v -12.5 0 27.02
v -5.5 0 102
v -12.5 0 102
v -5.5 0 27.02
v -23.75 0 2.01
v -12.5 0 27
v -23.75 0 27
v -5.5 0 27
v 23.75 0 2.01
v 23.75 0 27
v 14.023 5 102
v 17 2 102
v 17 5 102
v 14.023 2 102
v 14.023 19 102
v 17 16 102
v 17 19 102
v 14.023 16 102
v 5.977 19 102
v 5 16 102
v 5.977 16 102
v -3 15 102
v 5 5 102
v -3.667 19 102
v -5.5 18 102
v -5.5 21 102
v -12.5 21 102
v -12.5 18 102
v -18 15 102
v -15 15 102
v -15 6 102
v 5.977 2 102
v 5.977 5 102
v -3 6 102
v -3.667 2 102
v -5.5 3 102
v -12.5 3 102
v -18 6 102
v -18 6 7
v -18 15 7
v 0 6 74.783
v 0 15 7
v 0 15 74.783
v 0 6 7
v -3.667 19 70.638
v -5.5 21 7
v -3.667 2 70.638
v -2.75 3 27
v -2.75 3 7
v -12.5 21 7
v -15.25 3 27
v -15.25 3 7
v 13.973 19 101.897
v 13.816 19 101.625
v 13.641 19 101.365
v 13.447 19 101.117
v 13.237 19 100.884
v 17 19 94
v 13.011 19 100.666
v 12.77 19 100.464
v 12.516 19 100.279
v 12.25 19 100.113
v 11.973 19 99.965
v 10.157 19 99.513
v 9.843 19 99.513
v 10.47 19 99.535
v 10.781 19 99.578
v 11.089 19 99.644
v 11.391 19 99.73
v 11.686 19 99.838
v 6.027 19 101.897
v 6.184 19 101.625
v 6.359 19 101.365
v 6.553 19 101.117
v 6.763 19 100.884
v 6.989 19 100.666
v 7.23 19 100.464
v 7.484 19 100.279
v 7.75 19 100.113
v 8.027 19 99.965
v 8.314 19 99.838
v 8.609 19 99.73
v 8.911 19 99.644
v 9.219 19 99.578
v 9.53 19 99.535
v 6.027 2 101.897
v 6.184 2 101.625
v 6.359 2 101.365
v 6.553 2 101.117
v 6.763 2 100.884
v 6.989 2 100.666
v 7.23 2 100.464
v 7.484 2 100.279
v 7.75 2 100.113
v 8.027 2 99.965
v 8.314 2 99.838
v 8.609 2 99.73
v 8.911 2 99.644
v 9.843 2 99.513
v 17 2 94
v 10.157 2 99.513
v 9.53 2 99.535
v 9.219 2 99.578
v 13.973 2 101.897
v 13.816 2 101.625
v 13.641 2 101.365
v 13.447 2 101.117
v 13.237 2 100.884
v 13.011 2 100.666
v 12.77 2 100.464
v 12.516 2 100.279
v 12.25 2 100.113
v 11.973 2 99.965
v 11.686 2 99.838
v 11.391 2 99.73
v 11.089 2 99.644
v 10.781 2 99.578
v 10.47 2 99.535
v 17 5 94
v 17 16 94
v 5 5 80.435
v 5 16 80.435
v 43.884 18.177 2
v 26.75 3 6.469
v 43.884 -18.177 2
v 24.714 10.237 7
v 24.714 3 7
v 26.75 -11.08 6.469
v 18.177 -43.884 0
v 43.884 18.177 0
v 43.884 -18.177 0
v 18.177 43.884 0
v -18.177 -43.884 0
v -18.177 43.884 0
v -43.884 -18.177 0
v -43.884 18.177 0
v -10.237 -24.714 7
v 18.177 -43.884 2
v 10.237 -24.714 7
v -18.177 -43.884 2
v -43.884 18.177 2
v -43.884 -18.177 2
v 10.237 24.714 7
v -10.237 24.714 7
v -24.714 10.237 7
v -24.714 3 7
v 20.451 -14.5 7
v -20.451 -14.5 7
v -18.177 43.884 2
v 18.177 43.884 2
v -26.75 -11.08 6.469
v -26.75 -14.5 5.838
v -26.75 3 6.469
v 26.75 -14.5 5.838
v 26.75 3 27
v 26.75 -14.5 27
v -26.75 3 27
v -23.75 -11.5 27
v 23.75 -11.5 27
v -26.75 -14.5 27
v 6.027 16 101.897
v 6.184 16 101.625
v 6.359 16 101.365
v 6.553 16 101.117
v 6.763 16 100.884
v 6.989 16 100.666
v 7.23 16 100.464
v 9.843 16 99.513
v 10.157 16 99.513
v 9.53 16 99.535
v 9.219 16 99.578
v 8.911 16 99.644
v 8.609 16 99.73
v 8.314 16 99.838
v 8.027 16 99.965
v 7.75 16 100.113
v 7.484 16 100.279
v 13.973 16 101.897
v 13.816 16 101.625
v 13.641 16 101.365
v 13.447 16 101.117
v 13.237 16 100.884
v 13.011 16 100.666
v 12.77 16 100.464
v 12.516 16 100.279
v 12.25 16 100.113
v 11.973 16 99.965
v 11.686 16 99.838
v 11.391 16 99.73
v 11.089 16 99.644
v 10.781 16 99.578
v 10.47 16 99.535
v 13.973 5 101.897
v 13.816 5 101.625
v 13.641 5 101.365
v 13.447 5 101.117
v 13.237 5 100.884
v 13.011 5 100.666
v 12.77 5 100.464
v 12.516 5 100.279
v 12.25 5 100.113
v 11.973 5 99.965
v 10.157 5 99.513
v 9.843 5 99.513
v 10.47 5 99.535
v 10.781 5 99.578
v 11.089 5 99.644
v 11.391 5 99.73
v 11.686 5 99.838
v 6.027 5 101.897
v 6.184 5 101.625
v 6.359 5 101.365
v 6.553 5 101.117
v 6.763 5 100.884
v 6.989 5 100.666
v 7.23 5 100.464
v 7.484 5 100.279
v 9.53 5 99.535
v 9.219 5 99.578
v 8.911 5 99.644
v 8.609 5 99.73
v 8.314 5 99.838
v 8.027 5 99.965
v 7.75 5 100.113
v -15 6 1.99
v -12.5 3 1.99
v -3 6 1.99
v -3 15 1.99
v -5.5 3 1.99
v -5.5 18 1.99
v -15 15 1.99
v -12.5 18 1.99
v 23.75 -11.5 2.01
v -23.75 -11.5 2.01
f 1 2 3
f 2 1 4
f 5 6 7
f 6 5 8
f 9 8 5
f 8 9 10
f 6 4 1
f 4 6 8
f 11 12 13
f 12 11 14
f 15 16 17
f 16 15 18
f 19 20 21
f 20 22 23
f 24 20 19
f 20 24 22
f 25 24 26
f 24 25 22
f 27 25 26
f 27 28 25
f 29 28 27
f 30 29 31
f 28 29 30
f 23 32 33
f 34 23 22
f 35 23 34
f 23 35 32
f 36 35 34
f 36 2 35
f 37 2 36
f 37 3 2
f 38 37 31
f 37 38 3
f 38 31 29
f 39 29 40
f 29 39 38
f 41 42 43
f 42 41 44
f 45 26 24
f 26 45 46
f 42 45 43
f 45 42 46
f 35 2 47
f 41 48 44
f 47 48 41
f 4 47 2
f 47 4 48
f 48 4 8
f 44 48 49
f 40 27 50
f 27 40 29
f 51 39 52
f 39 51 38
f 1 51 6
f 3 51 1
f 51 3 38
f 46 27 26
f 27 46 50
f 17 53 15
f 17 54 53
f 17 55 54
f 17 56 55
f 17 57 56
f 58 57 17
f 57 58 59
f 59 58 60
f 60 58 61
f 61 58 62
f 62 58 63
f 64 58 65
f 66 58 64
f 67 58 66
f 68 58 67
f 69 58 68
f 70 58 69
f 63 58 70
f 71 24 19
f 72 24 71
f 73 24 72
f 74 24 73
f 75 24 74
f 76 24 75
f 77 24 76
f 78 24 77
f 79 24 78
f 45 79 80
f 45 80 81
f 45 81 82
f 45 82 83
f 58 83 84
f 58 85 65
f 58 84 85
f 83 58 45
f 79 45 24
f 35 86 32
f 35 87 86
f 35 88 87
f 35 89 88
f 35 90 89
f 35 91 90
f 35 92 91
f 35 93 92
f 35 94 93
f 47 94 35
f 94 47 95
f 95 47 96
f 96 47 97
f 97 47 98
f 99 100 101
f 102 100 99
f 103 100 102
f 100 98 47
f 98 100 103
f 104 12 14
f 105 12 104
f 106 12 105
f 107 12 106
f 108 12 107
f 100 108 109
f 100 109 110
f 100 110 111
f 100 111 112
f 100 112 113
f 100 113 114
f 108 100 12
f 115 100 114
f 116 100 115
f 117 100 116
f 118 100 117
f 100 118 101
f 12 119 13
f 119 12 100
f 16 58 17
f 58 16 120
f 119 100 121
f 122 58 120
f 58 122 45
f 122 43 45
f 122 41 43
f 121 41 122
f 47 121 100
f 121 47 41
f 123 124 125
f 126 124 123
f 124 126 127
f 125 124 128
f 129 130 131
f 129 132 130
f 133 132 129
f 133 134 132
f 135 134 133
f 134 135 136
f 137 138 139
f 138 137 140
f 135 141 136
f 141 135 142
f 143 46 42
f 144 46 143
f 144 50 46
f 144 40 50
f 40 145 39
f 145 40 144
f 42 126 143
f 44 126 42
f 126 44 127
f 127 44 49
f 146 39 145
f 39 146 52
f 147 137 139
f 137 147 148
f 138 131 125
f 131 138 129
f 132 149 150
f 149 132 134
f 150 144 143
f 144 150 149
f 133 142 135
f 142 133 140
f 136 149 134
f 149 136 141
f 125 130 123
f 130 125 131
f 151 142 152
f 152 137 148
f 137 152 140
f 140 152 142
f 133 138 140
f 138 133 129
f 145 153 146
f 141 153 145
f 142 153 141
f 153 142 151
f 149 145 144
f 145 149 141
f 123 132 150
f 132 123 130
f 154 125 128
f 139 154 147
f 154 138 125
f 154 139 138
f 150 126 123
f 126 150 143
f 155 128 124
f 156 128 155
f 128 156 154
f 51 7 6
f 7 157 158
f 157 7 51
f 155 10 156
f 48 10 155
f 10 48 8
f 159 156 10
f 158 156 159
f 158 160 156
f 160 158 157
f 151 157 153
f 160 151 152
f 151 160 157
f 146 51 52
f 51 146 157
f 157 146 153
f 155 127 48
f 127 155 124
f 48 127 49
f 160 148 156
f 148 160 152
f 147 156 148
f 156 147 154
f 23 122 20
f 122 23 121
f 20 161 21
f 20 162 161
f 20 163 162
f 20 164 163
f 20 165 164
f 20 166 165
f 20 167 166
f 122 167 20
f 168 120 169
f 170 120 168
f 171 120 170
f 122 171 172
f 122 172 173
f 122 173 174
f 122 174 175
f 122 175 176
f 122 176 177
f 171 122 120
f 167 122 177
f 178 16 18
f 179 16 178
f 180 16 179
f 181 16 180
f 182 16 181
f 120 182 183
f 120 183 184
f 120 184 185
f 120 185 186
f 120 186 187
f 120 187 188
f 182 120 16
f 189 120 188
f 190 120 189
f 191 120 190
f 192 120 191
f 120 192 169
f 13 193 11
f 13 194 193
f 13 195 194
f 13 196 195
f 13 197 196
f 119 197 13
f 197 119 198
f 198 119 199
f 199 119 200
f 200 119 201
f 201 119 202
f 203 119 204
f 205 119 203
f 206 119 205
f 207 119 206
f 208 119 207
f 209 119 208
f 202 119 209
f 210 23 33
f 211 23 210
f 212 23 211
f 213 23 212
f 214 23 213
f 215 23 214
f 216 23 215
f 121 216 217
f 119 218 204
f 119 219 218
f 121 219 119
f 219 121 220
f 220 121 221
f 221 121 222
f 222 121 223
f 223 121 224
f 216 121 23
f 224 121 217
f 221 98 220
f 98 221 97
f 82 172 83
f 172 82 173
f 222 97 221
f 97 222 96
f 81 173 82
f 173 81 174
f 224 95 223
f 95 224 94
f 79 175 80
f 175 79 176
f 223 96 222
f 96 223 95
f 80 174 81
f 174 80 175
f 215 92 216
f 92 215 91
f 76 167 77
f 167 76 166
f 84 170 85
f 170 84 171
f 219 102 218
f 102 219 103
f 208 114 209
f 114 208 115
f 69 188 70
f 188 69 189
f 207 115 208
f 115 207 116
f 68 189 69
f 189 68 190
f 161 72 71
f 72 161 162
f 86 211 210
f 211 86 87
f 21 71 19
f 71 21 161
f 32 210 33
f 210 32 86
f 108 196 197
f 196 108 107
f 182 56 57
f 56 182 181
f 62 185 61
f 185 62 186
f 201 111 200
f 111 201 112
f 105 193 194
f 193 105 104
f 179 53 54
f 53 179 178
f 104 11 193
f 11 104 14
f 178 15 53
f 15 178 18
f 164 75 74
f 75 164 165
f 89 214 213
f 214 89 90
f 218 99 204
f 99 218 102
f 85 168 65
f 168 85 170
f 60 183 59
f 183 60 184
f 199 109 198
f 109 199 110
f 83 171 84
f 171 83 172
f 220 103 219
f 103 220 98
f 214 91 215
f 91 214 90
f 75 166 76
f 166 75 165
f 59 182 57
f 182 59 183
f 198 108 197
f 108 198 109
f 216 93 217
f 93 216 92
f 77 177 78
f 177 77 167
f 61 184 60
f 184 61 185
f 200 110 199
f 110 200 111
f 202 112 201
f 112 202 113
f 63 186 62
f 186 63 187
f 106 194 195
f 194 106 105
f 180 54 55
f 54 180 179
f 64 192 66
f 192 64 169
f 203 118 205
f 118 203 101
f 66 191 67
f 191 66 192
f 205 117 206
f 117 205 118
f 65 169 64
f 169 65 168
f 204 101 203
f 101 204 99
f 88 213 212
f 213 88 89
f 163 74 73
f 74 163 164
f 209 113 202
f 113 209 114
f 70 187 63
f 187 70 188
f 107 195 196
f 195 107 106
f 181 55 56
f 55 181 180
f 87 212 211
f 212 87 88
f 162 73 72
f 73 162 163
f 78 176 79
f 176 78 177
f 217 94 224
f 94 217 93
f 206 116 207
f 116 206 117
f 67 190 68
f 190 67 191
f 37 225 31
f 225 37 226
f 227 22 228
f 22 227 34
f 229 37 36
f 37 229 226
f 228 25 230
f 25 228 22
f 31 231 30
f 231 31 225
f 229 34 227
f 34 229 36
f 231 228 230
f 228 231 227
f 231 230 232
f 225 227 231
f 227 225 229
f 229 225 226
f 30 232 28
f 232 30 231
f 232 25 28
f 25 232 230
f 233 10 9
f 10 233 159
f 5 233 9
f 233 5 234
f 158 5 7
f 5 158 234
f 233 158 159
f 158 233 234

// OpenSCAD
eps = 0.01;
$fn = 90;

// parameters
// base diameters
b_d = 95;
// base thickness
b_t = 2;
// base rising
b_r = 5;

// general parameters
// wall thickness
wt = 3;

// accessories dimensions
// rasor blade storage dimensions
rb_x = 47.5;
rb_y = 11.5;
rb_z = 72;
rb_h = 25;

// razor dimension
r_x = 9;
//r_y = 9;
r_y = 11;
r_o = 5;
r_z = 100;
r_d = 5;
r_do = 3;
r_t = 5+r_do;

// toothbrush dimensions
tb_X = 12;
tb_x = 7;
tb_Y = 15;
tb_y = 9;
tb_z = 100;

// possible extention into separete module
module base()
{
    hull()
    {
        cylinder(d=b_d, h=b_t, $fn=8);
        translate([0,0,b_t])
            cylinder(d=rb_x+2*wt, h=b_r, $fn=8);
    }
    
}

module holder()
{
    difference()
    {
        union()
        {
            // base
            rotate([0,0,22.5]) base();
            
            // toothbrush block
            translate([tb_X/2+wt-tb_X-2*wt,tb_Y/2+wt,b_t])
            {
                hull()
                {
                    // vertical
                    translate([-tb_x/2, -tb_Y/2-wt, 0])
                        cube([tb_x, tb_Y+2*wt, tb_z]);
                    // horizontal
                    translate([-tb_X/2-wt, -tb_y/2, 0])
                        cube([tb_X+2*wt, tb_y, tb_z]);
                }
                
                // razor hook
                hull()
                {
                    // razor hook
                    translate([tb_X/2+2*wt,-r_y/2-wt,r_z-r_t])
                        cube([r_o+r_x,r_y+2*wt,r_t]);
                    
                    // razor hook support
                    translate([0,
                                -r_y/2-wt,
                                r_z-r_o-r_x-r_t-tb_X/2-2*wt])
                        cube([  wt,
                                r_y+2*wt,
                                r_o+r_x+r_t+tb_X/2+2*wt]);
                }
                
            }
            
            // razor blades stock holder
            translate([-rb_x/2-wt,-rb_y-wt,b_t])
                cube([rb_x+2*wt,rb_y+2*wt,rb_h]);
        }
        
        // toothbrush hole
        translate([tb_X/2+wt-tb_X-2*wt,tb_Y/2+wt,b_t-eps])
        {
            hull()
            {
                // vertical
                translate([-tb_x/2, -tb_Y/2, 0])
                    cube([tb_x, tb_Y, tb_z+2*eps]);
                // horizontal
                translate([-tb_X/2, -tb_y/2, 0])
                    cube([tb_X, tb_y, tb_z+2*eps]);
            }
        
            // blade hole
            translate([tb_X/2+wt+r_o,-r_y/2,b_r+2*eps])
            {
                cube([r_x+wt+eps,r_y,r_z+eps]);
                
                // deeping
                translate([r_o,-wt-eps,r_z-b_r-r_do+r_d])
                    rotate([-90,0,0])
                        cylinder(h=r_y+2*wt+2*eps,d=r_x);
            }
        }
        
        // razor blade storage hole
        translate([-rb_x/2,-rb_y,b_t+eps])
            cube([rb_x,rb_y,rb_h+eps]);
    }
}

holder();
